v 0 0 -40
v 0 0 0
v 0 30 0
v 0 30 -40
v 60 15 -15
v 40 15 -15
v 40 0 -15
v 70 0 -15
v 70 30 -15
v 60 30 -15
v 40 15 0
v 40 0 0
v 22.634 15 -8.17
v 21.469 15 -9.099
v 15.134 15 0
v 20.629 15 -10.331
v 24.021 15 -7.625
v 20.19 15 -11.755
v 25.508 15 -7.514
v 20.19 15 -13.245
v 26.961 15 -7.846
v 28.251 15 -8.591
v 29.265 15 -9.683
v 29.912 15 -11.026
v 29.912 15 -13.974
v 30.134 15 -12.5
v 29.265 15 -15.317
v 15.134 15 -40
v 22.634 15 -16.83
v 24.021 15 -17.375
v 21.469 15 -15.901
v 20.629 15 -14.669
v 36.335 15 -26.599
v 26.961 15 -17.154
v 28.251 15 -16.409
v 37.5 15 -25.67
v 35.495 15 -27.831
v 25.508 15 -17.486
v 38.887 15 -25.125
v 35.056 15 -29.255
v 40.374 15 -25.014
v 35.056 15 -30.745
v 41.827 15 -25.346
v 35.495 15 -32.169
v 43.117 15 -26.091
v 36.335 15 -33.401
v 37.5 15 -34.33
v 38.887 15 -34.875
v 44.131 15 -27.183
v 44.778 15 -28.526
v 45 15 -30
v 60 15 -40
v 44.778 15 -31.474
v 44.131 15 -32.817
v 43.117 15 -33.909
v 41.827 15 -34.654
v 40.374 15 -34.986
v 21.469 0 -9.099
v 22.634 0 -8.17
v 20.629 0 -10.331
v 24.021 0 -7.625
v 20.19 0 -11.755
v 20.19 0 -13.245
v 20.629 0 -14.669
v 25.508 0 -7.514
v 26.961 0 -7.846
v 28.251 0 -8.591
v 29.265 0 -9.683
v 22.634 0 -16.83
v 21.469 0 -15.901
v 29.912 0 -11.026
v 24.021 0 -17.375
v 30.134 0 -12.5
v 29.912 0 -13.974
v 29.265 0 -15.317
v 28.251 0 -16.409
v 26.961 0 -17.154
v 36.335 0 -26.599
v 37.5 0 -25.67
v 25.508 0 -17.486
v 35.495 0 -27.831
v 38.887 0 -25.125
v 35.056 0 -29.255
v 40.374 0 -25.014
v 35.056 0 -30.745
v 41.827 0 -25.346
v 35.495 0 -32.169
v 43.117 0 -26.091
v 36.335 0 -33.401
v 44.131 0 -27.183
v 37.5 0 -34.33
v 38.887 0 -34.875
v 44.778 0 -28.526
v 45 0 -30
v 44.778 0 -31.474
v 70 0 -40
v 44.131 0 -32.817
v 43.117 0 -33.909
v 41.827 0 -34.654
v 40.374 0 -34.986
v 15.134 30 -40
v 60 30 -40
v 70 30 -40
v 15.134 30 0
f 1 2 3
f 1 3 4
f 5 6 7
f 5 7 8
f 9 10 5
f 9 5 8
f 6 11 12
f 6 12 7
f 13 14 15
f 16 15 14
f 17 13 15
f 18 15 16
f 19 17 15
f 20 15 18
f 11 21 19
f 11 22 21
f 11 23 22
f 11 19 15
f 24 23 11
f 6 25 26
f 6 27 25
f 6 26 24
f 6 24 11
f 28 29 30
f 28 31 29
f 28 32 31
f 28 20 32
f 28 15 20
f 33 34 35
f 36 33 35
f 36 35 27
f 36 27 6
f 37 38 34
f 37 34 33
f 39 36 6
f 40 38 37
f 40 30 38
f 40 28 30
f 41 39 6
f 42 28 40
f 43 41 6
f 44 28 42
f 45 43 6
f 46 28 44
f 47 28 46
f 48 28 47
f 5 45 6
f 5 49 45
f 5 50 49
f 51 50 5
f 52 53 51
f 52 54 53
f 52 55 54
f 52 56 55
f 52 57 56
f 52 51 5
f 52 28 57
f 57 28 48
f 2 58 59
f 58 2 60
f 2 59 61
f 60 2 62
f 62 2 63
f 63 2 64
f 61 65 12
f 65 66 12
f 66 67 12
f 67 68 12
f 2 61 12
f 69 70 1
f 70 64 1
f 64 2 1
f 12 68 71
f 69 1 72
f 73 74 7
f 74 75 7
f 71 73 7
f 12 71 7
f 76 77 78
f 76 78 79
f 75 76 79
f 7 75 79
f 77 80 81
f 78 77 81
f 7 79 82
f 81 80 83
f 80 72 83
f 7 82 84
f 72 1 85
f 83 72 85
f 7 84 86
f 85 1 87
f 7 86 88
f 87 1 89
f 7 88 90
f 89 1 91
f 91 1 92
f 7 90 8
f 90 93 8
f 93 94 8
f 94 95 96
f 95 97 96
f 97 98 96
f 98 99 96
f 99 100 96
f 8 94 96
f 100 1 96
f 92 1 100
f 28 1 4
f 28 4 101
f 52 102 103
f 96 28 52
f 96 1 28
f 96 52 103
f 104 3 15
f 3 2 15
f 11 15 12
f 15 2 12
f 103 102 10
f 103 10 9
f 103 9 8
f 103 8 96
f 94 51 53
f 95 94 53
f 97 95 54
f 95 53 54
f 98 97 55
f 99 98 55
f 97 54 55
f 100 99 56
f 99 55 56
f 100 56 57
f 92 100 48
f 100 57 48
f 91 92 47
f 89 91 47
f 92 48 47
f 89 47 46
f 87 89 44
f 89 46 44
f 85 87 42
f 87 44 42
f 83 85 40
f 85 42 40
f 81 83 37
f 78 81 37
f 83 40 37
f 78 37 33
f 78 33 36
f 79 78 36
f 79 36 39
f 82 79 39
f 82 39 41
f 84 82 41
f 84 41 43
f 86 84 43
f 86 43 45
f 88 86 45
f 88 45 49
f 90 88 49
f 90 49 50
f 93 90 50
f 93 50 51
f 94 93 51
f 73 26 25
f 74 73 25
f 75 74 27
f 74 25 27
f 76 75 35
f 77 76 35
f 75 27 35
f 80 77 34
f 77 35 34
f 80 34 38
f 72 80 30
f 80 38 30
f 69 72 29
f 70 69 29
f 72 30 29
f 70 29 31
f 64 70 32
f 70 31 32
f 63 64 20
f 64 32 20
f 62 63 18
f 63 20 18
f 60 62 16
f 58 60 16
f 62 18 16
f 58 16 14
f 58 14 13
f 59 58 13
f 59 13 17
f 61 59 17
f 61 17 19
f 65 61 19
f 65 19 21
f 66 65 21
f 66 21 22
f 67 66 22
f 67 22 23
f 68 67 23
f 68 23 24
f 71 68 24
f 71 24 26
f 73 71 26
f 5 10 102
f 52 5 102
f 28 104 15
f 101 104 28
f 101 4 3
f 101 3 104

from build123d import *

# Parameters (mm, degrees)
SKETCH1_W           = 70
SKETCH1_H           = 40
BOSS_EXTRUDE1_DEPTH = 30
SKETCH2_W           = 30
SKETCH2_H           = 15
CUT_EXTRUDE1_DEPTH  = 31
SKETCH3_W           = 45
SKETCH3_H           = 15
CUT_EXTRUDE2_DEPTH  = 41
SKETCH4_W           = 15.133947596
SKETCH4_H           = 40
BOSS_EXTRUDE2_DEPTH = 15
SKETCH6_R           = 5
CUT_EXTRUDE3_DEPTH  = 16
SKETCH7_R           = 5
CUT_EXTRUDE4_DEPTH  = 16
SKETCH8_W           = 3.137431518
SKETCH8_H           = 25
CUT_EXTRUDE5_DEPTH  = 15


with BuildPart() as part:
    # Sketch1 → Boss-Extrude1 (new body)
    with BuildSketch(Plane(origin=(0, 0, 0), x_dir=(1, 0, 0), z_dir=(0, 1, 0))):
        with Locations((35, 20)):
            Rectangle(SKETCH1_W, SKETCH1_H)
    extrude(amount=BOSS_EXTRUDE1_DEPTH)

    # Sketch2 → Cut-Extrude1 (cut, through all)
    with BuildSketch(Plane(origin=(0, 30, 0), x_dir=(1, 0, 0), z_dir=(0, 1, 0))):
        with Locations((55, 7.5)):
            Rectangle(SKETCH2_W, SKETCH2_H)
    extrude(amount=-CUT_EXTRUDE1_DEPTH, mode=Mode.SUBTRACT)

    # Sketch3 → Cut-Extrude2 (cut, through all)
    with BuildSketch(Plane(origin=(0, 0, -40), x_dir=(-1, 0, 0), z_dir=(0, 0, -1))):
        with Locations((-34.362568482, 22.5)):
            Rectangle(SKETCH3_W, SKETCH3_H)
    extrude(amount=-CUT_EXTRUDE2_DEPTH, mode=Mode.SUBTRACT)

    # Sketch4 → Boss-Extrude2 (add)
    with BuildSketch(Plane(origin=(0, 30, 0), x_dir=(1, 0, 0), z_dir=(0, 1, 0))):
        with Locations((7.566973798, 20)):
            Rectangle(SKETCH4_W, SKETCH4_H)
    extrude(amount=-BOSS_EXTRUDE2_DEPTH)

    # Sketch6 → Cut-Extrude3 (cut, through all)
    with BuildSketch(Plane(origin=(0, 15, 0), x_dir=(1, 0, 0), z_dir=(0, 1, 0))):
        with Locations((40, 30)):
            Circle(SKETCH6_R)
    extrude(amount=-CUT_EXTRUDE3_DEPTH, mode=Mode.SUBTRACT)

    # Sketch7 → Cut-Extrude4 (cut, through all)
    with BuildSketch(Plane(origin=(0, 15, 0), x_dir=(1, 0, 0), z_dir=(0, 1, 0))):
        with Locations((25.133947596, 12.5)):
            Circle(SKETCH7_R)
    extrude(amount=-CUT_EXTRUDE4_DEPTH, mode=Mode.SUBTRACT)

    # Sketch8 → Cut-Extrude5 (cut)
    with BuildSketch(Plane(origin=(0, 30, 0), x_dir=(1, 0, 0), z_dir=(0, 1, 0))):
        with Locations((58.431284241, 27.5)):
            Rectangle(SKETCH8_W, SKETCH8_H)
    extrude(amount=-CUT_EXTRUDE5_DEPTH, mode=Mode.SUBTRACT)


solid = part.part
